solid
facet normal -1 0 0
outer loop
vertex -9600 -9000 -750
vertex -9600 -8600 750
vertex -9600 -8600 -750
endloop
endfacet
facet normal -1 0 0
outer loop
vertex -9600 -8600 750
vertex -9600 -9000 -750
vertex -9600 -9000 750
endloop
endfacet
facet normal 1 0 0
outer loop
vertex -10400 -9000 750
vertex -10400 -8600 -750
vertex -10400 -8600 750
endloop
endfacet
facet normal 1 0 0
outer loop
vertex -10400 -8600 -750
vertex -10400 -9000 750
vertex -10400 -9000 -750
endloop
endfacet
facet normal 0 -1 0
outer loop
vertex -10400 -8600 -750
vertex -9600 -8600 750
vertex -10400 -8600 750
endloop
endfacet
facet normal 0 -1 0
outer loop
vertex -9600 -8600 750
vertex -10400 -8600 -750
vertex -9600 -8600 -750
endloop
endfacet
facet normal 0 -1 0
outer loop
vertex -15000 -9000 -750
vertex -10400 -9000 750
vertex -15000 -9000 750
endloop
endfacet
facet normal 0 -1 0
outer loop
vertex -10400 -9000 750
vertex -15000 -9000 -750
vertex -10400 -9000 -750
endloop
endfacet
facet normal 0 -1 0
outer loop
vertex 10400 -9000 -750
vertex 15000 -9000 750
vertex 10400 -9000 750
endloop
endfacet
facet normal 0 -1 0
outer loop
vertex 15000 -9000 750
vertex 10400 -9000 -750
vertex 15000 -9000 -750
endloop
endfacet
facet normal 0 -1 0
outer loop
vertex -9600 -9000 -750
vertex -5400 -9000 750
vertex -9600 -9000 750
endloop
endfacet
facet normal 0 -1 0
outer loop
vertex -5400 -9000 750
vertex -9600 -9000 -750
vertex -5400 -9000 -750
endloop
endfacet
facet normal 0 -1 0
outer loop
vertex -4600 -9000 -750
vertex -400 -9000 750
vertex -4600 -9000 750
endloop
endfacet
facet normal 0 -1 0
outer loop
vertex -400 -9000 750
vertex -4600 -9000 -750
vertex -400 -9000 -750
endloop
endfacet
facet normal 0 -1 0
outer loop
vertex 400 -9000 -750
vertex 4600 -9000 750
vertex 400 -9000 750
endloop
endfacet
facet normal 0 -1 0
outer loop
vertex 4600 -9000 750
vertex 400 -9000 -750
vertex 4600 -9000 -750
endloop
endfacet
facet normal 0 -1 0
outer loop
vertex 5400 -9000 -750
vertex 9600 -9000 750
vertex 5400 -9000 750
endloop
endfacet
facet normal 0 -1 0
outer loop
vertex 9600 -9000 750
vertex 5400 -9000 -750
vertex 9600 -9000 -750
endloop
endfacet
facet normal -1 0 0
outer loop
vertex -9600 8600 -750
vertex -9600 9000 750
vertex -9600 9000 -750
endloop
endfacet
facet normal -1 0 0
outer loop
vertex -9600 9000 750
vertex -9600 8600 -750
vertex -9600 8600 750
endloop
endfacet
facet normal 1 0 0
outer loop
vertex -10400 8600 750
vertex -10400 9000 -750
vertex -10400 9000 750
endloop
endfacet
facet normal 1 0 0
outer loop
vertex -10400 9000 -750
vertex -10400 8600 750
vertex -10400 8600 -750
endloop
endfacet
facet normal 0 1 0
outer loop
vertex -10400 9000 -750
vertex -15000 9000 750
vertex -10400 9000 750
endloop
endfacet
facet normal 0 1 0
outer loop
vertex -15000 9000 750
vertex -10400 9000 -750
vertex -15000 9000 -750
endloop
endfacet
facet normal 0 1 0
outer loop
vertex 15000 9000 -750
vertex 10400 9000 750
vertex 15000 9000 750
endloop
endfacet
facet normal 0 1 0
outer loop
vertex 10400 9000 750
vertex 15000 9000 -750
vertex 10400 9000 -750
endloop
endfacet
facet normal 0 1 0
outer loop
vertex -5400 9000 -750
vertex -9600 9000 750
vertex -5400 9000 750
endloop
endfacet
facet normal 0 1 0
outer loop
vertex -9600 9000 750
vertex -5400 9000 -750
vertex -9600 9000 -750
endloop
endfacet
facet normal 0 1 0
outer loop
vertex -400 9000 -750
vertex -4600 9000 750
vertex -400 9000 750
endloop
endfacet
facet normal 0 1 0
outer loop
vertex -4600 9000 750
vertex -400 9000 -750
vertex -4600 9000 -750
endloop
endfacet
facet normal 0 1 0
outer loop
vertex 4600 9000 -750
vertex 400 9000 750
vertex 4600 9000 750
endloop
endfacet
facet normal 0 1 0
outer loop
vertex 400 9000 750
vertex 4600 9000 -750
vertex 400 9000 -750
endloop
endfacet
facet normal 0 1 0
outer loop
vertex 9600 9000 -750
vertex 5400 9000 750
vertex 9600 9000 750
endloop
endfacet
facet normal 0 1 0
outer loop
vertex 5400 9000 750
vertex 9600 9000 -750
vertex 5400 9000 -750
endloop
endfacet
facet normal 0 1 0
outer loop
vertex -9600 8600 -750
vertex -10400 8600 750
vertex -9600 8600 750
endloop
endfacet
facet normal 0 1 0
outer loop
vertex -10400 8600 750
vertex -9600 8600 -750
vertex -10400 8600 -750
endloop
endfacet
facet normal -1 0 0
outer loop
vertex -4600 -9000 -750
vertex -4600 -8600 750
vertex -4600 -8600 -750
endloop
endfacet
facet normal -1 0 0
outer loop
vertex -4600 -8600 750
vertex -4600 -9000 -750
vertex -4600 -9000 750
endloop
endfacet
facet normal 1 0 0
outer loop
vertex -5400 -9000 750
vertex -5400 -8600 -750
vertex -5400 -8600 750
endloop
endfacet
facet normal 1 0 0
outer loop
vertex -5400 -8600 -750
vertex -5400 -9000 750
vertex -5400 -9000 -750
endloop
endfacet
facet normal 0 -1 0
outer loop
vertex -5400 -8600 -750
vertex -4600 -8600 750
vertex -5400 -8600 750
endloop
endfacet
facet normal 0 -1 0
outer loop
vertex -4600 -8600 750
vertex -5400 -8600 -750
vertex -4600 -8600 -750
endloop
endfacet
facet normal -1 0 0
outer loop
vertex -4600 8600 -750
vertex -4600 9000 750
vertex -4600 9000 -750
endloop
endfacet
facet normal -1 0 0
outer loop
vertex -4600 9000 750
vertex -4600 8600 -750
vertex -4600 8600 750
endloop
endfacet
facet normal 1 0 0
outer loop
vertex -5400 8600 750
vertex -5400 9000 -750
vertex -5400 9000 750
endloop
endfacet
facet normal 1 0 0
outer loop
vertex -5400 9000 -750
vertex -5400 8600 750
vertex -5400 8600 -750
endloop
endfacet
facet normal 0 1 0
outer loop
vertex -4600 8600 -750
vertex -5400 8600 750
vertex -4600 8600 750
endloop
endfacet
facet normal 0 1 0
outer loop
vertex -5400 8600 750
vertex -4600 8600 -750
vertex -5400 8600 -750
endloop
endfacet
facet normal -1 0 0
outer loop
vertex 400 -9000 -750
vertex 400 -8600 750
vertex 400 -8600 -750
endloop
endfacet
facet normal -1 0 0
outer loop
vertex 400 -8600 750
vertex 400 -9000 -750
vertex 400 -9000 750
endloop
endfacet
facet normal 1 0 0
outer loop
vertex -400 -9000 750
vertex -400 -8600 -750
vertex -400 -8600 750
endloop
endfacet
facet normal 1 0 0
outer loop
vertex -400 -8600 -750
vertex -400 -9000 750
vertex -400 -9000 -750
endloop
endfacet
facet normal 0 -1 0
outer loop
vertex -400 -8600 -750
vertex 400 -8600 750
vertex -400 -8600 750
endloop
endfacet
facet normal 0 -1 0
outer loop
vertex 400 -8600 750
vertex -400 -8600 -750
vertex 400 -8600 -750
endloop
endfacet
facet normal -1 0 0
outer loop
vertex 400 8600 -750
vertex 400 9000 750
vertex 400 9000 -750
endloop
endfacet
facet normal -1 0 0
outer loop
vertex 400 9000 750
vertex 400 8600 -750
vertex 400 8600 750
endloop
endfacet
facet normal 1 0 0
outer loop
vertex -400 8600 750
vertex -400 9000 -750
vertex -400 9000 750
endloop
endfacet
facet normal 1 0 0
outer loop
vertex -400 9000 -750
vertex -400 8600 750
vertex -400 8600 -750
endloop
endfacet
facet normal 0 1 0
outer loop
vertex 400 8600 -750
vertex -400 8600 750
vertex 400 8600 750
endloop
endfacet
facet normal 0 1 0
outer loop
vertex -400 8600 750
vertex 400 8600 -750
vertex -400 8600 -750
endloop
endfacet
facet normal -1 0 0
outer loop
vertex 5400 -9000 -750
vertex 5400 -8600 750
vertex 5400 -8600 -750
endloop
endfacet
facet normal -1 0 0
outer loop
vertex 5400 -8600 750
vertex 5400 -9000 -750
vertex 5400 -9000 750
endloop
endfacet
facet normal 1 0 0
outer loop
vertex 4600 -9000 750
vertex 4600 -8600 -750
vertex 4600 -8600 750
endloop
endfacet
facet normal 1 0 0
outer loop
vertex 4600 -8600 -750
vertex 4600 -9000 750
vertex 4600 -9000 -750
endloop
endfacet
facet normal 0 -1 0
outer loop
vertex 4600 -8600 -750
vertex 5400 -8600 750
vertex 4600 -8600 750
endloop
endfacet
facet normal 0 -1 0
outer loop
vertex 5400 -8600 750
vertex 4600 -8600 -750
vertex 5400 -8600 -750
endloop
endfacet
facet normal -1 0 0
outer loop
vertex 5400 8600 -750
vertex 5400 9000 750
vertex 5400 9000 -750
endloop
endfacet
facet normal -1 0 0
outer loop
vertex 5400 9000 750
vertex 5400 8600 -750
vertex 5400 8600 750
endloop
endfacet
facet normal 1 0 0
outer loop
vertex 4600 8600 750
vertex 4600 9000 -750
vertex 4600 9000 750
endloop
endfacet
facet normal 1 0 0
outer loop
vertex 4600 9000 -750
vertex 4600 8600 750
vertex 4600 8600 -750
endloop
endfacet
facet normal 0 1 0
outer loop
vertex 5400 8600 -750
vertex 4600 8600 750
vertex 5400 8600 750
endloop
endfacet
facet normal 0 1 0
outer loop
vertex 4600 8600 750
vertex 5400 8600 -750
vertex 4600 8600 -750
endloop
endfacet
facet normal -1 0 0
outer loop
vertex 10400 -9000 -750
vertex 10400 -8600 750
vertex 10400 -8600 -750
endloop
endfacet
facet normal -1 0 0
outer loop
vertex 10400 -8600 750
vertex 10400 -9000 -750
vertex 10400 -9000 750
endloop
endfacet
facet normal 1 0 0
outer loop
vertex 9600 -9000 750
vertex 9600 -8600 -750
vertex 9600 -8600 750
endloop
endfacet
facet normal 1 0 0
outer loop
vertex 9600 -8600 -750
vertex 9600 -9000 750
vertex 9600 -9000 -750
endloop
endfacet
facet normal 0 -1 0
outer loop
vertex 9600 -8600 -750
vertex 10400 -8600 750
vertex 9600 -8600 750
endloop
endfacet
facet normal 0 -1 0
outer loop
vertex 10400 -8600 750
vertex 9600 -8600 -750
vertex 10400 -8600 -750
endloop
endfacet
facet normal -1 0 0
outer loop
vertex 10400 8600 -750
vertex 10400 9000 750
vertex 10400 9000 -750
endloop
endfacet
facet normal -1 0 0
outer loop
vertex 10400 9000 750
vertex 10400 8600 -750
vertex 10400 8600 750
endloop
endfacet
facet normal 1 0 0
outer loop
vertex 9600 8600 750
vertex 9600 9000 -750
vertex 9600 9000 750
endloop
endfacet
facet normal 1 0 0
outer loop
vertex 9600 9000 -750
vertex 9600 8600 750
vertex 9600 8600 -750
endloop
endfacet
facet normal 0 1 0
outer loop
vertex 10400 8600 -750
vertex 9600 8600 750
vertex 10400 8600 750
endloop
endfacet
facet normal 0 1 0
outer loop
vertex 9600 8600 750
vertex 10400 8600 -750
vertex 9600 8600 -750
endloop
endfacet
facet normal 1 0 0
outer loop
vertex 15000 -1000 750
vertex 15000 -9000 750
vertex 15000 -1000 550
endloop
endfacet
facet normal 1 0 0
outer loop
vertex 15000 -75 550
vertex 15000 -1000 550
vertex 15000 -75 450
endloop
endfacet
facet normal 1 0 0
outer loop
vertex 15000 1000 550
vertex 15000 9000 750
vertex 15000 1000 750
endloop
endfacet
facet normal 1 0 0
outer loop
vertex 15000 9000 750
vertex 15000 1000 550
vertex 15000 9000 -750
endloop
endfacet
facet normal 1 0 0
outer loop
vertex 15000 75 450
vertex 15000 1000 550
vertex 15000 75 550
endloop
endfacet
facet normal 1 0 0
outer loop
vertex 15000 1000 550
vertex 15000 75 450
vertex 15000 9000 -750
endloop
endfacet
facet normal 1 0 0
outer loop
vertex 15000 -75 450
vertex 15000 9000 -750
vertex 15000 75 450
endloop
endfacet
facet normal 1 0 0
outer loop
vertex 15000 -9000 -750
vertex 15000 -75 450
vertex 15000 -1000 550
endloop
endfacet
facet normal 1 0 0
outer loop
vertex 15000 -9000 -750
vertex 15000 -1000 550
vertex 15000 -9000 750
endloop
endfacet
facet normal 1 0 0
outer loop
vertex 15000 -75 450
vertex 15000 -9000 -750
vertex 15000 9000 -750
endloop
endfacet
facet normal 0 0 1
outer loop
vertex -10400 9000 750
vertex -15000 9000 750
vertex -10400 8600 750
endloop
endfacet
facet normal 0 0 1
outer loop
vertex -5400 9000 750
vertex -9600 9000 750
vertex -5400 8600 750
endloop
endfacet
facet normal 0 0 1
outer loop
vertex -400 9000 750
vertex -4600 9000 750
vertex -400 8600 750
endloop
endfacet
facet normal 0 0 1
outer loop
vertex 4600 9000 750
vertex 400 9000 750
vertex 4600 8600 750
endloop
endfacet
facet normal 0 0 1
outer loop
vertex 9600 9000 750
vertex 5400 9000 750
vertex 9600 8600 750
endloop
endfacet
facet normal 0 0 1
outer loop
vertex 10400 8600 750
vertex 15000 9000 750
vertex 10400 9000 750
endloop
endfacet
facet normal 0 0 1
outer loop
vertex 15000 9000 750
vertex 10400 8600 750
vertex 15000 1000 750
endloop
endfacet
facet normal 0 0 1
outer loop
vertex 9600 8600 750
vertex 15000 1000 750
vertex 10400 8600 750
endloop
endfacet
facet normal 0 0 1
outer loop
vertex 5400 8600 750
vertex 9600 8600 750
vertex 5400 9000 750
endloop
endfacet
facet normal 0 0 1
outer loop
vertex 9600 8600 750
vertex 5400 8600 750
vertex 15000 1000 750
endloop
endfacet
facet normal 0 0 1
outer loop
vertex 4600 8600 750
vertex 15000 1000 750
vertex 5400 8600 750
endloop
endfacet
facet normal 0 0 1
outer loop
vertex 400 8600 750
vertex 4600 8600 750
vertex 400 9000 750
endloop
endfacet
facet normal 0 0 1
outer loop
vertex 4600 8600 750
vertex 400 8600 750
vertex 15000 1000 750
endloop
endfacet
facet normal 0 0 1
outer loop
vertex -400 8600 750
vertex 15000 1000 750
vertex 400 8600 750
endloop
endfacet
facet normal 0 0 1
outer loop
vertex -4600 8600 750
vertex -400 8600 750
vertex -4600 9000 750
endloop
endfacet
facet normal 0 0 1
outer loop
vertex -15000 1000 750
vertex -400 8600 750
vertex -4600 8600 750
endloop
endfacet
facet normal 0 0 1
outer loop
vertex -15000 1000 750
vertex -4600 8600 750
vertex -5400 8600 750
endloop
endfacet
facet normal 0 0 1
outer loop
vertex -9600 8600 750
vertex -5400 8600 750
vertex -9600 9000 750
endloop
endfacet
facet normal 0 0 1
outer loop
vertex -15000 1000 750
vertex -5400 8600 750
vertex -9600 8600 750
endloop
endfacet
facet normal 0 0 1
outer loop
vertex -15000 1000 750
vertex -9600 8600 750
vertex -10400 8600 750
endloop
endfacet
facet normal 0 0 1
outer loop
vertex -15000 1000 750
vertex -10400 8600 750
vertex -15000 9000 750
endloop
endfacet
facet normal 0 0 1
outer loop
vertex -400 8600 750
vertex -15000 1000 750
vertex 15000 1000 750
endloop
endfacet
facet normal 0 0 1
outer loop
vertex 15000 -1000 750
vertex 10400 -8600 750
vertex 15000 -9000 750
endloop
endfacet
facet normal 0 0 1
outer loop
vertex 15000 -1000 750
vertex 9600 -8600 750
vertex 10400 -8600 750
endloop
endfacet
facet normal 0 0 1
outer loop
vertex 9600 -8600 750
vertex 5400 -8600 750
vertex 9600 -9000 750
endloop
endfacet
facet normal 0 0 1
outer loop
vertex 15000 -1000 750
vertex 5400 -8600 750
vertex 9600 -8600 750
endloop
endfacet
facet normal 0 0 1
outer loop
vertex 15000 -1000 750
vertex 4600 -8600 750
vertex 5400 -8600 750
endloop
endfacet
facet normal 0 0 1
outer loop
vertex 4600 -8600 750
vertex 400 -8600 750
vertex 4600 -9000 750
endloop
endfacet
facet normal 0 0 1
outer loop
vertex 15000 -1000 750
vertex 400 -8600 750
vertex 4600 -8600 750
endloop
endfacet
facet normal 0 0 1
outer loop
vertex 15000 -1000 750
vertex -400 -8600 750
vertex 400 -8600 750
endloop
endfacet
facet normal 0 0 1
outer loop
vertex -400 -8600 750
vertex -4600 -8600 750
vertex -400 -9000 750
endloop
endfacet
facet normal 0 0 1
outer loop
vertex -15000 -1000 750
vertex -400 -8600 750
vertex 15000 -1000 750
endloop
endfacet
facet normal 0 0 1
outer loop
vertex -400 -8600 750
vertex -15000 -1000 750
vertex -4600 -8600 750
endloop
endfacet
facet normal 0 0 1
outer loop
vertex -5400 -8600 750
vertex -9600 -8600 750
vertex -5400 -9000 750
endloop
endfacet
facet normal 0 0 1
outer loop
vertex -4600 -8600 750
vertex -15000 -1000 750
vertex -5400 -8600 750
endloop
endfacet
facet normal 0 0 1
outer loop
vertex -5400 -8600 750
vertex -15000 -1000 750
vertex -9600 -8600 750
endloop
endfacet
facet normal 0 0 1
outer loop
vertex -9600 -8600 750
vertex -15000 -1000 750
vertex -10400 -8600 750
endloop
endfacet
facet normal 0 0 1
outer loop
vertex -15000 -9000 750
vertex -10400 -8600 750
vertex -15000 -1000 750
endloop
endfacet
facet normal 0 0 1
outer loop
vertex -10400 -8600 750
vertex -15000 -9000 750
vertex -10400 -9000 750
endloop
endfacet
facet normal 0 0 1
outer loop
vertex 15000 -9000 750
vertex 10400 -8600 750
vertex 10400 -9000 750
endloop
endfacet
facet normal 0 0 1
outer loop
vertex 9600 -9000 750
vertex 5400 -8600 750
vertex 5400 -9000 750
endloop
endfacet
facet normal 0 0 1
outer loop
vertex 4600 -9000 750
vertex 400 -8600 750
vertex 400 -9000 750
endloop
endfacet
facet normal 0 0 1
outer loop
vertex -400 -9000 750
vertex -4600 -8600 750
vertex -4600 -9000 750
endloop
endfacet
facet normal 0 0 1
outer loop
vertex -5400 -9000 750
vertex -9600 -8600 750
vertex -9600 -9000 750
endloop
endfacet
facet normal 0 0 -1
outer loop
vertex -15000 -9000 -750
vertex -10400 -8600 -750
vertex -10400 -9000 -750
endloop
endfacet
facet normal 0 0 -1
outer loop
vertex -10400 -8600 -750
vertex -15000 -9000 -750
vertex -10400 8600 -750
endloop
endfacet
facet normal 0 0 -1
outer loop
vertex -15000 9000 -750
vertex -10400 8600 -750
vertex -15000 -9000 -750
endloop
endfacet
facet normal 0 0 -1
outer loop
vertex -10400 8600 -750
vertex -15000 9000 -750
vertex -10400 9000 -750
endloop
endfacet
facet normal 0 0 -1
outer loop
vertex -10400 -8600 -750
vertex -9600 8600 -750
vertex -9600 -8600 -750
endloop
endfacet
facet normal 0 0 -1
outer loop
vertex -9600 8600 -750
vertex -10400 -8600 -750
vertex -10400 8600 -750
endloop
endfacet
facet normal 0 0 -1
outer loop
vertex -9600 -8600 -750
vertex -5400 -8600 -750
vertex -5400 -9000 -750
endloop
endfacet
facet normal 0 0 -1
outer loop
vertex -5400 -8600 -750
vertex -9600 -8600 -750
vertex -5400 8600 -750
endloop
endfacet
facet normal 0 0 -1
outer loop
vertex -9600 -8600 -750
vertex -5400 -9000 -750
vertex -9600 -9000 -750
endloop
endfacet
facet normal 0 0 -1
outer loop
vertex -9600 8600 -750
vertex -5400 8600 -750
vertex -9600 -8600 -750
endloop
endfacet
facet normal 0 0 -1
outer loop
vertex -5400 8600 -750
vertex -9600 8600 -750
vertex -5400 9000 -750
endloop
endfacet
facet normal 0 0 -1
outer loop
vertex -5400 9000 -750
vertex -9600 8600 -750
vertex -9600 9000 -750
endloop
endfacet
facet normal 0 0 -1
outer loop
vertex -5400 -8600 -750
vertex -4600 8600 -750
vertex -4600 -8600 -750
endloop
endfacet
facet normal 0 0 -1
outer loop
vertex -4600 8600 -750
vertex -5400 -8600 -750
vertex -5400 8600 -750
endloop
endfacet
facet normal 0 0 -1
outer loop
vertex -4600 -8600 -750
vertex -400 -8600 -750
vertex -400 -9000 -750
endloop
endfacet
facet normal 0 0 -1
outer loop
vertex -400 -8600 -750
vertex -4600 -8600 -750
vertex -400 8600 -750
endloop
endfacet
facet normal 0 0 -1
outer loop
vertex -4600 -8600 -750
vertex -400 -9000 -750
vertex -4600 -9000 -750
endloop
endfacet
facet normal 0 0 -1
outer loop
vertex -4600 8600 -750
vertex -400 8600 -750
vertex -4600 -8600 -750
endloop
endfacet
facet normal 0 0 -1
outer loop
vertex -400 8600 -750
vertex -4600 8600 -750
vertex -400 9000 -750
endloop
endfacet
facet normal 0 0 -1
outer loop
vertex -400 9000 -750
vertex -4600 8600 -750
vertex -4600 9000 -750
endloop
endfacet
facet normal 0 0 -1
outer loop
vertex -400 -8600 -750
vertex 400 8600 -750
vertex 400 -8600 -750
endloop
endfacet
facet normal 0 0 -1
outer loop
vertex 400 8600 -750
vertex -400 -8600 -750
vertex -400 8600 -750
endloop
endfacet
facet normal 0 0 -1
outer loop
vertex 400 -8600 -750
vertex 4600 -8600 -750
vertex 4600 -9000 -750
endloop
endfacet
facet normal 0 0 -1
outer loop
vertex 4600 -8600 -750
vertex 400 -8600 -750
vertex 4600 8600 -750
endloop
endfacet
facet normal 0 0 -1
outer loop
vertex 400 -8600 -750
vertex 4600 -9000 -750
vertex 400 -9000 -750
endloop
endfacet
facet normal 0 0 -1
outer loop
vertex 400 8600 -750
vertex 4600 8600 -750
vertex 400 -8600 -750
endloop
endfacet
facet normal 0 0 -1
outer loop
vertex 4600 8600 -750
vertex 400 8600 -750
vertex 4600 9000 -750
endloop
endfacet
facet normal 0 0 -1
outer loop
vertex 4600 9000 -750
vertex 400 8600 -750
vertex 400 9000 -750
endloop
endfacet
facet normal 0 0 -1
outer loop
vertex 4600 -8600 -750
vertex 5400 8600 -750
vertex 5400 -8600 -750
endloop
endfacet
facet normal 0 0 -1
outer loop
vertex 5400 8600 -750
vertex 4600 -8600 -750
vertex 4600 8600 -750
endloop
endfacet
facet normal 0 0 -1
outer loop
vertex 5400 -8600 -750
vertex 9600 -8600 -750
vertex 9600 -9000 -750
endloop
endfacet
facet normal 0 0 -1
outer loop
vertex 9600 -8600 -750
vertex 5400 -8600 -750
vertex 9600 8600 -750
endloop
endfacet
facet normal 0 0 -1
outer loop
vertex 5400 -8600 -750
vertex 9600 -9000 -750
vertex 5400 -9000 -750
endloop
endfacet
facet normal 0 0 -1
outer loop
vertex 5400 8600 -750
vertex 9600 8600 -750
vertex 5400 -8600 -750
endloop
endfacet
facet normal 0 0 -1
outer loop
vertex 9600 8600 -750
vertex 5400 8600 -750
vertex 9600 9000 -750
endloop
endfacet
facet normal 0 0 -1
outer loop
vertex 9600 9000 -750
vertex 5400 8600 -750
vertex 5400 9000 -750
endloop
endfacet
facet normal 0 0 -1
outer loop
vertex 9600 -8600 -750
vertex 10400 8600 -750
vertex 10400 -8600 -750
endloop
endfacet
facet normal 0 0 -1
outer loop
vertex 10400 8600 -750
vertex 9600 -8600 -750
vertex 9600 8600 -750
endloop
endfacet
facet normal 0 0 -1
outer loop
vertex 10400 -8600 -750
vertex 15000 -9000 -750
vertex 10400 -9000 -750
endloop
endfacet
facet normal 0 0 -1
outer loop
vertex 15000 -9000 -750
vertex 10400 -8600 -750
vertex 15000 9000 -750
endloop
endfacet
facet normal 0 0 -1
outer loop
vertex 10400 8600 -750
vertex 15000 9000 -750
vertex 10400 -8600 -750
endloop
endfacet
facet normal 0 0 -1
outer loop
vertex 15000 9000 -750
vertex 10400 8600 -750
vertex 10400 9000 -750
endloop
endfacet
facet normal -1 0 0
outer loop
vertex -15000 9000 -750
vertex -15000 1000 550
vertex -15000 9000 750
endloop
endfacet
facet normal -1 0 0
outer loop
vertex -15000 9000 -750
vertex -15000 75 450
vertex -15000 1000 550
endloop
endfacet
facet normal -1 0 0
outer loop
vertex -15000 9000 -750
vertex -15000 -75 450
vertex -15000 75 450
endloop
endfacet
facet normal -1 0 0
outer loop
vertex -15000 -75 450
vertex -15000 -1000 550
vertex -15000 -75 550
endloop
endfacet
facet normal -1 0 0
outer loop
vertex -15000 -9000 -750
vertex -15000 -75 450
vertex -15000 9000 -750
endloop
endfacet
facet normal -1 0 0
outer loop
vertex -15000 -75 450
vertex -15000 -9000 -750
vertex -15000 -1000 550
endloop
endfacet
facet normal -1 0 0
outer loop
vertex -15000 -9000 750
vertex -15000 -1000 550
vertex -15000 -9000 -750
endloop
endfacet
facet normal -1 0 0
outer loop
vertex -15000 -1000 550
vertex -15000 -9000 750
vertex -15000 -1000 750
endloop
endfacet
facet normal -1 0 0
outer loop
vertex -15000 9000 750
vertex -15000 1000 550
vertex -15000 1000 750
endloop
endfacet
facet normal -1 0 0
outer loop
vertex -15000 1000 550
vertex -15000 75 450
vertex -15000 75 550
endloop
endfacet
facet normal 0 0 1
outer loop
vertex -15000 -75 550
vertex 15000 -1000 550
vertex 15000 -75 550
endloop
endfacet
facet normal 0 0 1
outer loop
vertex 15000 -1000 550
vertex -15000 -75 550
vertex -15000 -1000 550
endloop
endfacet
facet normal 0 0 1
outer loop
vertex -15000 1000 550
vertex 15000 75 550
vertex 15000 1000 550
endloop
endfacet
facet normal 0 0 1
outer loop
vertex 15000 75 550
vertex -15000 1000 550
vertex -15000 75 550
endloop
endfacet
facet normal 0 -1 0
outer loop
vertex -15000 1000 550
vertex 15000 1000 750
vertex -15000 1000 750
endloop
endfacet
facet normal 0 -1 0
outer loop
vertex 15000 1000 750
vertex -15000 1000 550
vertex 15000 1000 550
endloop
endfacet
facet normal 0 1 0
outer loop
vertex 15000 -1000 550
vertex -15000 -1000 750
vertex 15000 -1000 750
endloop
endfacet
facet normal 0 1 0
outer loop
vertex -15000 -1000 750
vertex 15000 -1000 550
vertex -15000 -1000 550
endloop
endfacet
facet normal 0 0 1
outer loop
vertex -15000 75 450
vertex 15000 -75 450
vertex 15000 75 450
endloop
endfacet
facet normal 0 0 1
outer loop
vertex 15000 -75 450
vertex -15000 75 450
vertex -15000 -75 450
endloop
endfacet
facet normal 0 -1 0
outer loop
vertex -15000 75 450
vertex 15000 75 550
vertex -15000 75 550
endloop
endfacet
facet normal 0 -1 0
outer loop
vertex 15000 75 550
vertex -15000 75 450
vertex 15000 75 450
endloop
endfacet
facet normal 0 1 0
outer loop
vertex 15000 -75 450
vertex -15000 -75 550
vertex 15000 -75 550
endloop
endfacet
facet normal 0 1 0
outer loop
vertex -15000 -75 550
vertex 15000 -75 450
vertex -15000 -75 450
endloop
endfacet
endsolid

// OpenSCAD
// =========================================================================
// GRUMMAN-STYLED INFLATABLE CARRIER - INTEGRATED EDDY-TAPE LAUNCH TRACK
// MANUFACTURER: HUNTINGTON INGALLS / NEWPORT NEWS SHIPBUILDING
// MATERIAL SPECIFICATION: TITANIUM GRADE 5 WITH RECESSED INDUCTION MATRIX
// =========================================================================

module titanium_eddy_deck_plate(length=30000, width=18000, thickness=1500) {
    difference() {
        // Core Grade 5 Titanium Flatbed Landing Slab
        cube([length, width, thickness], center=true);
        
        // Continuous Central Recessed Channel for Eddy-Tape Levitation Rolls
        // Flush-mount depth prevents runway lips or surface structural hazards
        translate([0, 0, thickness/2 - 100])
            cube([length + 20, 2000, 200], center=true);
            
        // Underlying Conduit Channel for Solid-State Power Harness
        translate([0, 0, thickness/2 - 250])
            cube([length + 20, 150, 100], center=true);
            
        // Passive Edge Drainage Scuppers (Retained from V2 Framework)
        for (x_offset = [-length/3 : length/6 : length/3]) {
            translate([x_offset, -width/2 + 200, 0]) cube([800, 400, thickness + 20], center=true);
            translate([x_offset, width/2 - 200, 0])  cube([800, 400, thickness + 20], center=true);
        }
    }
}

// Instantiate fully magnetic flight deck segment
titanium_eddy_deck_plate();
